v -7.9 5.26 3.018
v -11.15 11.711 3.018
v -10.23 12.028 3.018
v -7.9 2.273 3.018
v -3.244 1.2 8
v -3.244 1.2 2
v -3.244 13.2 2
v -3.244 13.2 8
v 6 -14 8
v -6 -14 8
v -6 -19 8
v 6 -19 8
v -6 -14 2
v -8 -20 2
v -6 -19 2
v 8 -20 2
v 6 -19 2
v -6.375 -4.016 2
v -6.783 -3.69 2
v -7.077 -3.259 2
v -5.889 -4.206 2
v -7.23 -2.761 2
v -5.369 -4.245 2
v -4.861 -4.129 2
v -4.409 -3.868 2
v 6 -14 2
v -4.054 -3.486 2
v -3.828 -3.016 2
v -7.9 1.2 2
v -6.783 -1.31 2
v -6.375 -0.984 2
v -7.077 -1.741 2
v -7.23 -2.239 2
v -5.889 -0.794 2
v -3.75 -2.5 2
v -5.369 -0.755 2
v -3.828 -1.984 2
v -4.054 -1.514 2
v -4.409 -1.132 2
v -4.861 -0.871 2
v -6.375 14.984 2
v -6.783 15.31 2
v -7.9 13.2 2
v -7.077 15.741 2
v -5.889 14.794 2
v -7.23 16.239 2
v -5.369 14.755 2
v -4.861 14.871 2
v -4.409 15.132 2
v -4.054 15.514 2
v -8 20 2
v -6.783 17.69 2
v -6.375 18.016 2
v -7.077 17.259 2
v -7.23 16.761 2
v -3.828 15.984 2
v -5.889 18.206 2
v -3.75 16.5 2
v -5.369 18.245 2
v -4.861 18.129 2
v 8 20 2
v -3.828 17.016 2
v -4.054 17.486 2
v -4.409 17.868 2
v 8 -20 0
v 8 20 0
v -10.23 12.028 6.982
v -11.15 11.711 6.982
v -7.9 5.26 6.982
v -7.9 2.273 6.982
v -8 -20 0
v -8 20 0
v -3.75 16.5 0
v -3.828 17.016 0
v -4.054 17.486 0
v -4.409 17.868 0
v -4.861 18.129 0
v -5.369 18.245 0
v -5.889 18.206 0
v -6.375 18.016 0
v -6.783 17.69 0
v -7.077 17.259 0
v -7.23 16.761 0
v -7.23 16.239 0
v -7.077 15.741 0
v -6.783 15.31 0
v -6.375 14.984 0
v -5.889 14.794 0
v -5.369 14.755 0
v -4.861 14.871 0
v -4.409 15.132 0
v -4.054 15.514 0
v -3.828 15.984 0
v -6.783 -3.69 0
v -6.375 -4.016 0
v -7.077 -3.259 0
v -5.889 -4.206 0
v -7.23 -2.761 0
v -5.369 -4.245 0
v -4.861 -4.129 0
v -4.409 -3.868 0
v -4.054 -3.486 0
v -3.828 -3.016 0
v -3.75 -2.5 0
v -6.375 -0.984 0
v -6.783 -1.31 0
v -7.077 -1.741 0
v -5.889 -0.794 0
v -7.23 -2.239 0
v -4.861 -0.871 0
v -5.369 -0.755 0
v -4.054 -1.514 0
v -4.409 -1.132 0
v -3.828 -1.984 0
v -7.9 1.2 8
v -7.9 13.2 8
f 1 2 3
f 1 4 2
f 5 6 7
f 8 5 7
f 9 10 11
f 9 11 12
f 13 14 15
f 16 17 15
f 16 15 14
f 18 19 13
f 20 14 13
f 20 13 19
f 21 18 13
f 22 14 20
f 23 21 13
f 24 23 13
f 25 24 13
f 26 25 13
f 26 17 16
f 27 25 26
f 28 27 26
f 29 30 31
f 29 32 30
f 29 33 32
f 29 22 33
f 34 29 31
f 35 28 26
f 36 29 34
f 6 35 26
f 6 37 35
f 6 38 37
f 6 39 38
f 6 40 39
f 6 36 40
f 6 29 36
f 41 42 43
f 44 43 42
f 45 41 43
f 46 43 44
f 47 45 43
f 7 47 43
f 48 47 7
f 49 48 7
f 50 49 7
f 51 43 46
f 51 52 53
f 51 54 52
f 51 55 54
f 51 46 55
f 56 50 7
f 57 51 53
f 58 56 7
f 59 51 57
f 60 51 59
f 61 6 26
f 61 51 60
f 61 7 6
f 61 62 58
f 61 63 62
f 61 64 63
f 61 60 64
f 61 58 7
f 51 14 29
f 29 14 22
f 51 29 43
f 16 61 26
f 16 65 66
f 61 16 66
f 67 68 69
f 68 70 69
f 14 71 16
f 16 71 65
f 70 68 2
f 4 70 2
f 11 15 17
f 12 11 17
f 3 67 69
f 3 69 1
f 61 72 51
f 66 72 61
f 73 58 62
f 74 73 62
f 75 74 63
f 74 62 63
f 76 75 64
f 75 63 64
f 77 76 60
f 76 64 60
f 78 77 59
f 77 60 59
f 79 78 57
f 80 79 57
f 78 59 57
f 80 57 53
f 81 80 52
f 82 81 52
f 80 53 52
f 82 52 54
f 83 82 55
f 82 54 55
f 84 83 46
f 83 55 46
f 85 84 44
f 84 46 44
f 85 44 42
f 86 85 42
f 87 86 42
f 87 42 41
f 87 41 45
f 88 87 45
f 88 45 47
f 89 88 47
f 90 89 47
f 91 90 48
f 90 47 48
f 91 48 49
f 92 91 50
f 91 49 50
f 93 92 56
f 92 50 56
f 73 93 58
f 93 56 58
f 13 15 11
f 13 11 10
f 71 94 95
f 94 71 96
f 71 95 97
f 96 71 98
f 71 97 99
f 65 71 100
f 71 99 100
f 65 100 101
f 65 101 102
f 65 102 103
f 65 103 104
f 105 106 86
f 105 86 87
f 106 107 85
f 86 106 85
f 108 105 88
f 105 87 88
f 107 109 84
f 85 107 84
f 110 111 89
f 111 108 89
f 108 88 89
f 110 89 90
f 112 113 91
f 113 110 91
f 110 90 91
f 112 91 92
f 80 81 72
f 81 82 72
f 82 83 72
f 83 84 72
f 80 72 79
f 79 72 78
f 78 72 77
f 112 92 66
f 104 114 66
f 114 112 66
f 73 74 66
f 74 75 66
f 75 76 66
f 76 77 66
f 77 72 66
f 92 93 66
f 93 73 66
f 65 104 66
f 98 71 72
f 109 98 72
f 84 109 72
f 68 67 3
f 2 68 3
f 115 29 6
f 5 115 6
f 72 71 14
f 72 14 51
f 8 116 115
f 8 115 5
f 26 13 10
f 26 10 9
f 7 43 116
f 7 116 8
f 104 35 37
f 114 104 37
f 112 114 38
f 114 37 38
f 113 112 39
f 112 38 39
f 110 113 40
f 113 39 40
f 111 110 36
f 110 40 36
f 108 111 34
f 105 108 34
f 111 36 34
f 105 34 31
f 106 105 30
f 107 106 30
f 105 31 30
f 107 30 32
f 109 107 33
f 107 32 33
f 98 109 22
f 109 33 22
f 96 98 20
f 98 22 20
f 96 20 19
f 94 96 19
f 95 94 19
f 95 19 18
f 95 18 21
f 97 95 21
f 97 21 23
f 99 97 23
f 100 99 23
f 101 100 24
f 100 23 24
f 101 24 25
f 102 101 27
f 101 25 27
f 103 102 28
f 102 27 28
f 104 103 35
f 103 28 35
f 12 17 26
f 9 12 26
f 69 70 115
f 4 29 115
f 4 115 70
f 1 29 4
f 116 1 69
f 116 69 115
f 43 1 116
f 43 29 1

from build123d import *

# Parameters (mm, degrees)
ESBO_O1_W                     = 16
ESBO_O1_H                     = 40
RESSALTO_EXTRUS_O1_DEPTH      = 2
ESBO_O2_R                     = 1.75
CORTE_EXTRUS_O1_DEPTH         = 2
ESBO_O3_W                     = 4.656179748
ESBO_O3_H                     = 12
RESSALTO_EXTRUS_O2_DEPTH      = 6
ESBO_O4_W                     = 12
ESBO_O4_H                     = 5
RESSALTO_EXTRUS_O3_DEPTH      = 6
RESSALTO_EXTRUS_O4_DEPTH      = 9
RESSALTO_EXTRUS_O4_DEPTH_BACK = 1.2
ESBO_O6_W                     = 3.964999664
ESBO_O6_H                     = 0.972728158


with BuildPart() as part:
    # Esboço1 → Ressalto-extrusão1 (new body)
    with BuildSketch(Plane.XY):
        Rectangle(ESBO_O1_W, ESBO_O1_H)
    extrude(amount=RESSALTO_EXTRUS_O1_DEPTH)

    # Esboço2 → Corte-extrusão1 (cut)
    with BuildSketch(Plane.XY.offset(2)):
        with Locations((-5.5, 16.5)):
            Circle(ESBO_O2_R)
        with Locations((-5.5, -2.5)):
            Circle(ESBO_O2_R)
    extrude(amount=-CORTE_EXTRUS_O1_DEPTH, mode=Mode.SUBTRACT)

    # Esboço3 → Ressalto-extrusão2 (add)
    with BuildSketch(Plane.XY.offset(2)):
        with Locations((-5.571910126, 7.2)):
            Rectangle(ESBO_O3_W, ESBO_O3_H)
    extrude(amount=RESSALTO_EXTRUS_O2_DEPTH)

    # Esboço4 → Ressalto-extrusão3 (add)
    with BuildSketch(Plane.XY.offset(2)):
        with Locations((0, -16.5)):
            Rectangle(ESBO_O4_W, ESBO_O4_H)
    extrude(amount=RESSALTO_EXTRUS_O3_DEPTH)

    # Esboço6 → Ressalto-extrusão4 (add, two sides: drawn at the far end of the back side and taken through both)
    with BuildSketch(Plane(origin=(-4.396287548, 12.767746119, 0), x_dir=(0, 0, -1), z_dir=(0.32556815445715404, -0.9455185755993177, 0)).offset(-RESSALTO_EXTRUS_O4_DEPTH_BACK)):
        with Locations((-5, -6.243358943)):
            Rectangle(ESBO_O6_W, ESBO_O6_H)
    extrude(amount=RESSALTO_EXTRUS_O4_DEPTH + RESSALTO_EXTRUS_O4_DEPTH_BACK)


solid = part.part
